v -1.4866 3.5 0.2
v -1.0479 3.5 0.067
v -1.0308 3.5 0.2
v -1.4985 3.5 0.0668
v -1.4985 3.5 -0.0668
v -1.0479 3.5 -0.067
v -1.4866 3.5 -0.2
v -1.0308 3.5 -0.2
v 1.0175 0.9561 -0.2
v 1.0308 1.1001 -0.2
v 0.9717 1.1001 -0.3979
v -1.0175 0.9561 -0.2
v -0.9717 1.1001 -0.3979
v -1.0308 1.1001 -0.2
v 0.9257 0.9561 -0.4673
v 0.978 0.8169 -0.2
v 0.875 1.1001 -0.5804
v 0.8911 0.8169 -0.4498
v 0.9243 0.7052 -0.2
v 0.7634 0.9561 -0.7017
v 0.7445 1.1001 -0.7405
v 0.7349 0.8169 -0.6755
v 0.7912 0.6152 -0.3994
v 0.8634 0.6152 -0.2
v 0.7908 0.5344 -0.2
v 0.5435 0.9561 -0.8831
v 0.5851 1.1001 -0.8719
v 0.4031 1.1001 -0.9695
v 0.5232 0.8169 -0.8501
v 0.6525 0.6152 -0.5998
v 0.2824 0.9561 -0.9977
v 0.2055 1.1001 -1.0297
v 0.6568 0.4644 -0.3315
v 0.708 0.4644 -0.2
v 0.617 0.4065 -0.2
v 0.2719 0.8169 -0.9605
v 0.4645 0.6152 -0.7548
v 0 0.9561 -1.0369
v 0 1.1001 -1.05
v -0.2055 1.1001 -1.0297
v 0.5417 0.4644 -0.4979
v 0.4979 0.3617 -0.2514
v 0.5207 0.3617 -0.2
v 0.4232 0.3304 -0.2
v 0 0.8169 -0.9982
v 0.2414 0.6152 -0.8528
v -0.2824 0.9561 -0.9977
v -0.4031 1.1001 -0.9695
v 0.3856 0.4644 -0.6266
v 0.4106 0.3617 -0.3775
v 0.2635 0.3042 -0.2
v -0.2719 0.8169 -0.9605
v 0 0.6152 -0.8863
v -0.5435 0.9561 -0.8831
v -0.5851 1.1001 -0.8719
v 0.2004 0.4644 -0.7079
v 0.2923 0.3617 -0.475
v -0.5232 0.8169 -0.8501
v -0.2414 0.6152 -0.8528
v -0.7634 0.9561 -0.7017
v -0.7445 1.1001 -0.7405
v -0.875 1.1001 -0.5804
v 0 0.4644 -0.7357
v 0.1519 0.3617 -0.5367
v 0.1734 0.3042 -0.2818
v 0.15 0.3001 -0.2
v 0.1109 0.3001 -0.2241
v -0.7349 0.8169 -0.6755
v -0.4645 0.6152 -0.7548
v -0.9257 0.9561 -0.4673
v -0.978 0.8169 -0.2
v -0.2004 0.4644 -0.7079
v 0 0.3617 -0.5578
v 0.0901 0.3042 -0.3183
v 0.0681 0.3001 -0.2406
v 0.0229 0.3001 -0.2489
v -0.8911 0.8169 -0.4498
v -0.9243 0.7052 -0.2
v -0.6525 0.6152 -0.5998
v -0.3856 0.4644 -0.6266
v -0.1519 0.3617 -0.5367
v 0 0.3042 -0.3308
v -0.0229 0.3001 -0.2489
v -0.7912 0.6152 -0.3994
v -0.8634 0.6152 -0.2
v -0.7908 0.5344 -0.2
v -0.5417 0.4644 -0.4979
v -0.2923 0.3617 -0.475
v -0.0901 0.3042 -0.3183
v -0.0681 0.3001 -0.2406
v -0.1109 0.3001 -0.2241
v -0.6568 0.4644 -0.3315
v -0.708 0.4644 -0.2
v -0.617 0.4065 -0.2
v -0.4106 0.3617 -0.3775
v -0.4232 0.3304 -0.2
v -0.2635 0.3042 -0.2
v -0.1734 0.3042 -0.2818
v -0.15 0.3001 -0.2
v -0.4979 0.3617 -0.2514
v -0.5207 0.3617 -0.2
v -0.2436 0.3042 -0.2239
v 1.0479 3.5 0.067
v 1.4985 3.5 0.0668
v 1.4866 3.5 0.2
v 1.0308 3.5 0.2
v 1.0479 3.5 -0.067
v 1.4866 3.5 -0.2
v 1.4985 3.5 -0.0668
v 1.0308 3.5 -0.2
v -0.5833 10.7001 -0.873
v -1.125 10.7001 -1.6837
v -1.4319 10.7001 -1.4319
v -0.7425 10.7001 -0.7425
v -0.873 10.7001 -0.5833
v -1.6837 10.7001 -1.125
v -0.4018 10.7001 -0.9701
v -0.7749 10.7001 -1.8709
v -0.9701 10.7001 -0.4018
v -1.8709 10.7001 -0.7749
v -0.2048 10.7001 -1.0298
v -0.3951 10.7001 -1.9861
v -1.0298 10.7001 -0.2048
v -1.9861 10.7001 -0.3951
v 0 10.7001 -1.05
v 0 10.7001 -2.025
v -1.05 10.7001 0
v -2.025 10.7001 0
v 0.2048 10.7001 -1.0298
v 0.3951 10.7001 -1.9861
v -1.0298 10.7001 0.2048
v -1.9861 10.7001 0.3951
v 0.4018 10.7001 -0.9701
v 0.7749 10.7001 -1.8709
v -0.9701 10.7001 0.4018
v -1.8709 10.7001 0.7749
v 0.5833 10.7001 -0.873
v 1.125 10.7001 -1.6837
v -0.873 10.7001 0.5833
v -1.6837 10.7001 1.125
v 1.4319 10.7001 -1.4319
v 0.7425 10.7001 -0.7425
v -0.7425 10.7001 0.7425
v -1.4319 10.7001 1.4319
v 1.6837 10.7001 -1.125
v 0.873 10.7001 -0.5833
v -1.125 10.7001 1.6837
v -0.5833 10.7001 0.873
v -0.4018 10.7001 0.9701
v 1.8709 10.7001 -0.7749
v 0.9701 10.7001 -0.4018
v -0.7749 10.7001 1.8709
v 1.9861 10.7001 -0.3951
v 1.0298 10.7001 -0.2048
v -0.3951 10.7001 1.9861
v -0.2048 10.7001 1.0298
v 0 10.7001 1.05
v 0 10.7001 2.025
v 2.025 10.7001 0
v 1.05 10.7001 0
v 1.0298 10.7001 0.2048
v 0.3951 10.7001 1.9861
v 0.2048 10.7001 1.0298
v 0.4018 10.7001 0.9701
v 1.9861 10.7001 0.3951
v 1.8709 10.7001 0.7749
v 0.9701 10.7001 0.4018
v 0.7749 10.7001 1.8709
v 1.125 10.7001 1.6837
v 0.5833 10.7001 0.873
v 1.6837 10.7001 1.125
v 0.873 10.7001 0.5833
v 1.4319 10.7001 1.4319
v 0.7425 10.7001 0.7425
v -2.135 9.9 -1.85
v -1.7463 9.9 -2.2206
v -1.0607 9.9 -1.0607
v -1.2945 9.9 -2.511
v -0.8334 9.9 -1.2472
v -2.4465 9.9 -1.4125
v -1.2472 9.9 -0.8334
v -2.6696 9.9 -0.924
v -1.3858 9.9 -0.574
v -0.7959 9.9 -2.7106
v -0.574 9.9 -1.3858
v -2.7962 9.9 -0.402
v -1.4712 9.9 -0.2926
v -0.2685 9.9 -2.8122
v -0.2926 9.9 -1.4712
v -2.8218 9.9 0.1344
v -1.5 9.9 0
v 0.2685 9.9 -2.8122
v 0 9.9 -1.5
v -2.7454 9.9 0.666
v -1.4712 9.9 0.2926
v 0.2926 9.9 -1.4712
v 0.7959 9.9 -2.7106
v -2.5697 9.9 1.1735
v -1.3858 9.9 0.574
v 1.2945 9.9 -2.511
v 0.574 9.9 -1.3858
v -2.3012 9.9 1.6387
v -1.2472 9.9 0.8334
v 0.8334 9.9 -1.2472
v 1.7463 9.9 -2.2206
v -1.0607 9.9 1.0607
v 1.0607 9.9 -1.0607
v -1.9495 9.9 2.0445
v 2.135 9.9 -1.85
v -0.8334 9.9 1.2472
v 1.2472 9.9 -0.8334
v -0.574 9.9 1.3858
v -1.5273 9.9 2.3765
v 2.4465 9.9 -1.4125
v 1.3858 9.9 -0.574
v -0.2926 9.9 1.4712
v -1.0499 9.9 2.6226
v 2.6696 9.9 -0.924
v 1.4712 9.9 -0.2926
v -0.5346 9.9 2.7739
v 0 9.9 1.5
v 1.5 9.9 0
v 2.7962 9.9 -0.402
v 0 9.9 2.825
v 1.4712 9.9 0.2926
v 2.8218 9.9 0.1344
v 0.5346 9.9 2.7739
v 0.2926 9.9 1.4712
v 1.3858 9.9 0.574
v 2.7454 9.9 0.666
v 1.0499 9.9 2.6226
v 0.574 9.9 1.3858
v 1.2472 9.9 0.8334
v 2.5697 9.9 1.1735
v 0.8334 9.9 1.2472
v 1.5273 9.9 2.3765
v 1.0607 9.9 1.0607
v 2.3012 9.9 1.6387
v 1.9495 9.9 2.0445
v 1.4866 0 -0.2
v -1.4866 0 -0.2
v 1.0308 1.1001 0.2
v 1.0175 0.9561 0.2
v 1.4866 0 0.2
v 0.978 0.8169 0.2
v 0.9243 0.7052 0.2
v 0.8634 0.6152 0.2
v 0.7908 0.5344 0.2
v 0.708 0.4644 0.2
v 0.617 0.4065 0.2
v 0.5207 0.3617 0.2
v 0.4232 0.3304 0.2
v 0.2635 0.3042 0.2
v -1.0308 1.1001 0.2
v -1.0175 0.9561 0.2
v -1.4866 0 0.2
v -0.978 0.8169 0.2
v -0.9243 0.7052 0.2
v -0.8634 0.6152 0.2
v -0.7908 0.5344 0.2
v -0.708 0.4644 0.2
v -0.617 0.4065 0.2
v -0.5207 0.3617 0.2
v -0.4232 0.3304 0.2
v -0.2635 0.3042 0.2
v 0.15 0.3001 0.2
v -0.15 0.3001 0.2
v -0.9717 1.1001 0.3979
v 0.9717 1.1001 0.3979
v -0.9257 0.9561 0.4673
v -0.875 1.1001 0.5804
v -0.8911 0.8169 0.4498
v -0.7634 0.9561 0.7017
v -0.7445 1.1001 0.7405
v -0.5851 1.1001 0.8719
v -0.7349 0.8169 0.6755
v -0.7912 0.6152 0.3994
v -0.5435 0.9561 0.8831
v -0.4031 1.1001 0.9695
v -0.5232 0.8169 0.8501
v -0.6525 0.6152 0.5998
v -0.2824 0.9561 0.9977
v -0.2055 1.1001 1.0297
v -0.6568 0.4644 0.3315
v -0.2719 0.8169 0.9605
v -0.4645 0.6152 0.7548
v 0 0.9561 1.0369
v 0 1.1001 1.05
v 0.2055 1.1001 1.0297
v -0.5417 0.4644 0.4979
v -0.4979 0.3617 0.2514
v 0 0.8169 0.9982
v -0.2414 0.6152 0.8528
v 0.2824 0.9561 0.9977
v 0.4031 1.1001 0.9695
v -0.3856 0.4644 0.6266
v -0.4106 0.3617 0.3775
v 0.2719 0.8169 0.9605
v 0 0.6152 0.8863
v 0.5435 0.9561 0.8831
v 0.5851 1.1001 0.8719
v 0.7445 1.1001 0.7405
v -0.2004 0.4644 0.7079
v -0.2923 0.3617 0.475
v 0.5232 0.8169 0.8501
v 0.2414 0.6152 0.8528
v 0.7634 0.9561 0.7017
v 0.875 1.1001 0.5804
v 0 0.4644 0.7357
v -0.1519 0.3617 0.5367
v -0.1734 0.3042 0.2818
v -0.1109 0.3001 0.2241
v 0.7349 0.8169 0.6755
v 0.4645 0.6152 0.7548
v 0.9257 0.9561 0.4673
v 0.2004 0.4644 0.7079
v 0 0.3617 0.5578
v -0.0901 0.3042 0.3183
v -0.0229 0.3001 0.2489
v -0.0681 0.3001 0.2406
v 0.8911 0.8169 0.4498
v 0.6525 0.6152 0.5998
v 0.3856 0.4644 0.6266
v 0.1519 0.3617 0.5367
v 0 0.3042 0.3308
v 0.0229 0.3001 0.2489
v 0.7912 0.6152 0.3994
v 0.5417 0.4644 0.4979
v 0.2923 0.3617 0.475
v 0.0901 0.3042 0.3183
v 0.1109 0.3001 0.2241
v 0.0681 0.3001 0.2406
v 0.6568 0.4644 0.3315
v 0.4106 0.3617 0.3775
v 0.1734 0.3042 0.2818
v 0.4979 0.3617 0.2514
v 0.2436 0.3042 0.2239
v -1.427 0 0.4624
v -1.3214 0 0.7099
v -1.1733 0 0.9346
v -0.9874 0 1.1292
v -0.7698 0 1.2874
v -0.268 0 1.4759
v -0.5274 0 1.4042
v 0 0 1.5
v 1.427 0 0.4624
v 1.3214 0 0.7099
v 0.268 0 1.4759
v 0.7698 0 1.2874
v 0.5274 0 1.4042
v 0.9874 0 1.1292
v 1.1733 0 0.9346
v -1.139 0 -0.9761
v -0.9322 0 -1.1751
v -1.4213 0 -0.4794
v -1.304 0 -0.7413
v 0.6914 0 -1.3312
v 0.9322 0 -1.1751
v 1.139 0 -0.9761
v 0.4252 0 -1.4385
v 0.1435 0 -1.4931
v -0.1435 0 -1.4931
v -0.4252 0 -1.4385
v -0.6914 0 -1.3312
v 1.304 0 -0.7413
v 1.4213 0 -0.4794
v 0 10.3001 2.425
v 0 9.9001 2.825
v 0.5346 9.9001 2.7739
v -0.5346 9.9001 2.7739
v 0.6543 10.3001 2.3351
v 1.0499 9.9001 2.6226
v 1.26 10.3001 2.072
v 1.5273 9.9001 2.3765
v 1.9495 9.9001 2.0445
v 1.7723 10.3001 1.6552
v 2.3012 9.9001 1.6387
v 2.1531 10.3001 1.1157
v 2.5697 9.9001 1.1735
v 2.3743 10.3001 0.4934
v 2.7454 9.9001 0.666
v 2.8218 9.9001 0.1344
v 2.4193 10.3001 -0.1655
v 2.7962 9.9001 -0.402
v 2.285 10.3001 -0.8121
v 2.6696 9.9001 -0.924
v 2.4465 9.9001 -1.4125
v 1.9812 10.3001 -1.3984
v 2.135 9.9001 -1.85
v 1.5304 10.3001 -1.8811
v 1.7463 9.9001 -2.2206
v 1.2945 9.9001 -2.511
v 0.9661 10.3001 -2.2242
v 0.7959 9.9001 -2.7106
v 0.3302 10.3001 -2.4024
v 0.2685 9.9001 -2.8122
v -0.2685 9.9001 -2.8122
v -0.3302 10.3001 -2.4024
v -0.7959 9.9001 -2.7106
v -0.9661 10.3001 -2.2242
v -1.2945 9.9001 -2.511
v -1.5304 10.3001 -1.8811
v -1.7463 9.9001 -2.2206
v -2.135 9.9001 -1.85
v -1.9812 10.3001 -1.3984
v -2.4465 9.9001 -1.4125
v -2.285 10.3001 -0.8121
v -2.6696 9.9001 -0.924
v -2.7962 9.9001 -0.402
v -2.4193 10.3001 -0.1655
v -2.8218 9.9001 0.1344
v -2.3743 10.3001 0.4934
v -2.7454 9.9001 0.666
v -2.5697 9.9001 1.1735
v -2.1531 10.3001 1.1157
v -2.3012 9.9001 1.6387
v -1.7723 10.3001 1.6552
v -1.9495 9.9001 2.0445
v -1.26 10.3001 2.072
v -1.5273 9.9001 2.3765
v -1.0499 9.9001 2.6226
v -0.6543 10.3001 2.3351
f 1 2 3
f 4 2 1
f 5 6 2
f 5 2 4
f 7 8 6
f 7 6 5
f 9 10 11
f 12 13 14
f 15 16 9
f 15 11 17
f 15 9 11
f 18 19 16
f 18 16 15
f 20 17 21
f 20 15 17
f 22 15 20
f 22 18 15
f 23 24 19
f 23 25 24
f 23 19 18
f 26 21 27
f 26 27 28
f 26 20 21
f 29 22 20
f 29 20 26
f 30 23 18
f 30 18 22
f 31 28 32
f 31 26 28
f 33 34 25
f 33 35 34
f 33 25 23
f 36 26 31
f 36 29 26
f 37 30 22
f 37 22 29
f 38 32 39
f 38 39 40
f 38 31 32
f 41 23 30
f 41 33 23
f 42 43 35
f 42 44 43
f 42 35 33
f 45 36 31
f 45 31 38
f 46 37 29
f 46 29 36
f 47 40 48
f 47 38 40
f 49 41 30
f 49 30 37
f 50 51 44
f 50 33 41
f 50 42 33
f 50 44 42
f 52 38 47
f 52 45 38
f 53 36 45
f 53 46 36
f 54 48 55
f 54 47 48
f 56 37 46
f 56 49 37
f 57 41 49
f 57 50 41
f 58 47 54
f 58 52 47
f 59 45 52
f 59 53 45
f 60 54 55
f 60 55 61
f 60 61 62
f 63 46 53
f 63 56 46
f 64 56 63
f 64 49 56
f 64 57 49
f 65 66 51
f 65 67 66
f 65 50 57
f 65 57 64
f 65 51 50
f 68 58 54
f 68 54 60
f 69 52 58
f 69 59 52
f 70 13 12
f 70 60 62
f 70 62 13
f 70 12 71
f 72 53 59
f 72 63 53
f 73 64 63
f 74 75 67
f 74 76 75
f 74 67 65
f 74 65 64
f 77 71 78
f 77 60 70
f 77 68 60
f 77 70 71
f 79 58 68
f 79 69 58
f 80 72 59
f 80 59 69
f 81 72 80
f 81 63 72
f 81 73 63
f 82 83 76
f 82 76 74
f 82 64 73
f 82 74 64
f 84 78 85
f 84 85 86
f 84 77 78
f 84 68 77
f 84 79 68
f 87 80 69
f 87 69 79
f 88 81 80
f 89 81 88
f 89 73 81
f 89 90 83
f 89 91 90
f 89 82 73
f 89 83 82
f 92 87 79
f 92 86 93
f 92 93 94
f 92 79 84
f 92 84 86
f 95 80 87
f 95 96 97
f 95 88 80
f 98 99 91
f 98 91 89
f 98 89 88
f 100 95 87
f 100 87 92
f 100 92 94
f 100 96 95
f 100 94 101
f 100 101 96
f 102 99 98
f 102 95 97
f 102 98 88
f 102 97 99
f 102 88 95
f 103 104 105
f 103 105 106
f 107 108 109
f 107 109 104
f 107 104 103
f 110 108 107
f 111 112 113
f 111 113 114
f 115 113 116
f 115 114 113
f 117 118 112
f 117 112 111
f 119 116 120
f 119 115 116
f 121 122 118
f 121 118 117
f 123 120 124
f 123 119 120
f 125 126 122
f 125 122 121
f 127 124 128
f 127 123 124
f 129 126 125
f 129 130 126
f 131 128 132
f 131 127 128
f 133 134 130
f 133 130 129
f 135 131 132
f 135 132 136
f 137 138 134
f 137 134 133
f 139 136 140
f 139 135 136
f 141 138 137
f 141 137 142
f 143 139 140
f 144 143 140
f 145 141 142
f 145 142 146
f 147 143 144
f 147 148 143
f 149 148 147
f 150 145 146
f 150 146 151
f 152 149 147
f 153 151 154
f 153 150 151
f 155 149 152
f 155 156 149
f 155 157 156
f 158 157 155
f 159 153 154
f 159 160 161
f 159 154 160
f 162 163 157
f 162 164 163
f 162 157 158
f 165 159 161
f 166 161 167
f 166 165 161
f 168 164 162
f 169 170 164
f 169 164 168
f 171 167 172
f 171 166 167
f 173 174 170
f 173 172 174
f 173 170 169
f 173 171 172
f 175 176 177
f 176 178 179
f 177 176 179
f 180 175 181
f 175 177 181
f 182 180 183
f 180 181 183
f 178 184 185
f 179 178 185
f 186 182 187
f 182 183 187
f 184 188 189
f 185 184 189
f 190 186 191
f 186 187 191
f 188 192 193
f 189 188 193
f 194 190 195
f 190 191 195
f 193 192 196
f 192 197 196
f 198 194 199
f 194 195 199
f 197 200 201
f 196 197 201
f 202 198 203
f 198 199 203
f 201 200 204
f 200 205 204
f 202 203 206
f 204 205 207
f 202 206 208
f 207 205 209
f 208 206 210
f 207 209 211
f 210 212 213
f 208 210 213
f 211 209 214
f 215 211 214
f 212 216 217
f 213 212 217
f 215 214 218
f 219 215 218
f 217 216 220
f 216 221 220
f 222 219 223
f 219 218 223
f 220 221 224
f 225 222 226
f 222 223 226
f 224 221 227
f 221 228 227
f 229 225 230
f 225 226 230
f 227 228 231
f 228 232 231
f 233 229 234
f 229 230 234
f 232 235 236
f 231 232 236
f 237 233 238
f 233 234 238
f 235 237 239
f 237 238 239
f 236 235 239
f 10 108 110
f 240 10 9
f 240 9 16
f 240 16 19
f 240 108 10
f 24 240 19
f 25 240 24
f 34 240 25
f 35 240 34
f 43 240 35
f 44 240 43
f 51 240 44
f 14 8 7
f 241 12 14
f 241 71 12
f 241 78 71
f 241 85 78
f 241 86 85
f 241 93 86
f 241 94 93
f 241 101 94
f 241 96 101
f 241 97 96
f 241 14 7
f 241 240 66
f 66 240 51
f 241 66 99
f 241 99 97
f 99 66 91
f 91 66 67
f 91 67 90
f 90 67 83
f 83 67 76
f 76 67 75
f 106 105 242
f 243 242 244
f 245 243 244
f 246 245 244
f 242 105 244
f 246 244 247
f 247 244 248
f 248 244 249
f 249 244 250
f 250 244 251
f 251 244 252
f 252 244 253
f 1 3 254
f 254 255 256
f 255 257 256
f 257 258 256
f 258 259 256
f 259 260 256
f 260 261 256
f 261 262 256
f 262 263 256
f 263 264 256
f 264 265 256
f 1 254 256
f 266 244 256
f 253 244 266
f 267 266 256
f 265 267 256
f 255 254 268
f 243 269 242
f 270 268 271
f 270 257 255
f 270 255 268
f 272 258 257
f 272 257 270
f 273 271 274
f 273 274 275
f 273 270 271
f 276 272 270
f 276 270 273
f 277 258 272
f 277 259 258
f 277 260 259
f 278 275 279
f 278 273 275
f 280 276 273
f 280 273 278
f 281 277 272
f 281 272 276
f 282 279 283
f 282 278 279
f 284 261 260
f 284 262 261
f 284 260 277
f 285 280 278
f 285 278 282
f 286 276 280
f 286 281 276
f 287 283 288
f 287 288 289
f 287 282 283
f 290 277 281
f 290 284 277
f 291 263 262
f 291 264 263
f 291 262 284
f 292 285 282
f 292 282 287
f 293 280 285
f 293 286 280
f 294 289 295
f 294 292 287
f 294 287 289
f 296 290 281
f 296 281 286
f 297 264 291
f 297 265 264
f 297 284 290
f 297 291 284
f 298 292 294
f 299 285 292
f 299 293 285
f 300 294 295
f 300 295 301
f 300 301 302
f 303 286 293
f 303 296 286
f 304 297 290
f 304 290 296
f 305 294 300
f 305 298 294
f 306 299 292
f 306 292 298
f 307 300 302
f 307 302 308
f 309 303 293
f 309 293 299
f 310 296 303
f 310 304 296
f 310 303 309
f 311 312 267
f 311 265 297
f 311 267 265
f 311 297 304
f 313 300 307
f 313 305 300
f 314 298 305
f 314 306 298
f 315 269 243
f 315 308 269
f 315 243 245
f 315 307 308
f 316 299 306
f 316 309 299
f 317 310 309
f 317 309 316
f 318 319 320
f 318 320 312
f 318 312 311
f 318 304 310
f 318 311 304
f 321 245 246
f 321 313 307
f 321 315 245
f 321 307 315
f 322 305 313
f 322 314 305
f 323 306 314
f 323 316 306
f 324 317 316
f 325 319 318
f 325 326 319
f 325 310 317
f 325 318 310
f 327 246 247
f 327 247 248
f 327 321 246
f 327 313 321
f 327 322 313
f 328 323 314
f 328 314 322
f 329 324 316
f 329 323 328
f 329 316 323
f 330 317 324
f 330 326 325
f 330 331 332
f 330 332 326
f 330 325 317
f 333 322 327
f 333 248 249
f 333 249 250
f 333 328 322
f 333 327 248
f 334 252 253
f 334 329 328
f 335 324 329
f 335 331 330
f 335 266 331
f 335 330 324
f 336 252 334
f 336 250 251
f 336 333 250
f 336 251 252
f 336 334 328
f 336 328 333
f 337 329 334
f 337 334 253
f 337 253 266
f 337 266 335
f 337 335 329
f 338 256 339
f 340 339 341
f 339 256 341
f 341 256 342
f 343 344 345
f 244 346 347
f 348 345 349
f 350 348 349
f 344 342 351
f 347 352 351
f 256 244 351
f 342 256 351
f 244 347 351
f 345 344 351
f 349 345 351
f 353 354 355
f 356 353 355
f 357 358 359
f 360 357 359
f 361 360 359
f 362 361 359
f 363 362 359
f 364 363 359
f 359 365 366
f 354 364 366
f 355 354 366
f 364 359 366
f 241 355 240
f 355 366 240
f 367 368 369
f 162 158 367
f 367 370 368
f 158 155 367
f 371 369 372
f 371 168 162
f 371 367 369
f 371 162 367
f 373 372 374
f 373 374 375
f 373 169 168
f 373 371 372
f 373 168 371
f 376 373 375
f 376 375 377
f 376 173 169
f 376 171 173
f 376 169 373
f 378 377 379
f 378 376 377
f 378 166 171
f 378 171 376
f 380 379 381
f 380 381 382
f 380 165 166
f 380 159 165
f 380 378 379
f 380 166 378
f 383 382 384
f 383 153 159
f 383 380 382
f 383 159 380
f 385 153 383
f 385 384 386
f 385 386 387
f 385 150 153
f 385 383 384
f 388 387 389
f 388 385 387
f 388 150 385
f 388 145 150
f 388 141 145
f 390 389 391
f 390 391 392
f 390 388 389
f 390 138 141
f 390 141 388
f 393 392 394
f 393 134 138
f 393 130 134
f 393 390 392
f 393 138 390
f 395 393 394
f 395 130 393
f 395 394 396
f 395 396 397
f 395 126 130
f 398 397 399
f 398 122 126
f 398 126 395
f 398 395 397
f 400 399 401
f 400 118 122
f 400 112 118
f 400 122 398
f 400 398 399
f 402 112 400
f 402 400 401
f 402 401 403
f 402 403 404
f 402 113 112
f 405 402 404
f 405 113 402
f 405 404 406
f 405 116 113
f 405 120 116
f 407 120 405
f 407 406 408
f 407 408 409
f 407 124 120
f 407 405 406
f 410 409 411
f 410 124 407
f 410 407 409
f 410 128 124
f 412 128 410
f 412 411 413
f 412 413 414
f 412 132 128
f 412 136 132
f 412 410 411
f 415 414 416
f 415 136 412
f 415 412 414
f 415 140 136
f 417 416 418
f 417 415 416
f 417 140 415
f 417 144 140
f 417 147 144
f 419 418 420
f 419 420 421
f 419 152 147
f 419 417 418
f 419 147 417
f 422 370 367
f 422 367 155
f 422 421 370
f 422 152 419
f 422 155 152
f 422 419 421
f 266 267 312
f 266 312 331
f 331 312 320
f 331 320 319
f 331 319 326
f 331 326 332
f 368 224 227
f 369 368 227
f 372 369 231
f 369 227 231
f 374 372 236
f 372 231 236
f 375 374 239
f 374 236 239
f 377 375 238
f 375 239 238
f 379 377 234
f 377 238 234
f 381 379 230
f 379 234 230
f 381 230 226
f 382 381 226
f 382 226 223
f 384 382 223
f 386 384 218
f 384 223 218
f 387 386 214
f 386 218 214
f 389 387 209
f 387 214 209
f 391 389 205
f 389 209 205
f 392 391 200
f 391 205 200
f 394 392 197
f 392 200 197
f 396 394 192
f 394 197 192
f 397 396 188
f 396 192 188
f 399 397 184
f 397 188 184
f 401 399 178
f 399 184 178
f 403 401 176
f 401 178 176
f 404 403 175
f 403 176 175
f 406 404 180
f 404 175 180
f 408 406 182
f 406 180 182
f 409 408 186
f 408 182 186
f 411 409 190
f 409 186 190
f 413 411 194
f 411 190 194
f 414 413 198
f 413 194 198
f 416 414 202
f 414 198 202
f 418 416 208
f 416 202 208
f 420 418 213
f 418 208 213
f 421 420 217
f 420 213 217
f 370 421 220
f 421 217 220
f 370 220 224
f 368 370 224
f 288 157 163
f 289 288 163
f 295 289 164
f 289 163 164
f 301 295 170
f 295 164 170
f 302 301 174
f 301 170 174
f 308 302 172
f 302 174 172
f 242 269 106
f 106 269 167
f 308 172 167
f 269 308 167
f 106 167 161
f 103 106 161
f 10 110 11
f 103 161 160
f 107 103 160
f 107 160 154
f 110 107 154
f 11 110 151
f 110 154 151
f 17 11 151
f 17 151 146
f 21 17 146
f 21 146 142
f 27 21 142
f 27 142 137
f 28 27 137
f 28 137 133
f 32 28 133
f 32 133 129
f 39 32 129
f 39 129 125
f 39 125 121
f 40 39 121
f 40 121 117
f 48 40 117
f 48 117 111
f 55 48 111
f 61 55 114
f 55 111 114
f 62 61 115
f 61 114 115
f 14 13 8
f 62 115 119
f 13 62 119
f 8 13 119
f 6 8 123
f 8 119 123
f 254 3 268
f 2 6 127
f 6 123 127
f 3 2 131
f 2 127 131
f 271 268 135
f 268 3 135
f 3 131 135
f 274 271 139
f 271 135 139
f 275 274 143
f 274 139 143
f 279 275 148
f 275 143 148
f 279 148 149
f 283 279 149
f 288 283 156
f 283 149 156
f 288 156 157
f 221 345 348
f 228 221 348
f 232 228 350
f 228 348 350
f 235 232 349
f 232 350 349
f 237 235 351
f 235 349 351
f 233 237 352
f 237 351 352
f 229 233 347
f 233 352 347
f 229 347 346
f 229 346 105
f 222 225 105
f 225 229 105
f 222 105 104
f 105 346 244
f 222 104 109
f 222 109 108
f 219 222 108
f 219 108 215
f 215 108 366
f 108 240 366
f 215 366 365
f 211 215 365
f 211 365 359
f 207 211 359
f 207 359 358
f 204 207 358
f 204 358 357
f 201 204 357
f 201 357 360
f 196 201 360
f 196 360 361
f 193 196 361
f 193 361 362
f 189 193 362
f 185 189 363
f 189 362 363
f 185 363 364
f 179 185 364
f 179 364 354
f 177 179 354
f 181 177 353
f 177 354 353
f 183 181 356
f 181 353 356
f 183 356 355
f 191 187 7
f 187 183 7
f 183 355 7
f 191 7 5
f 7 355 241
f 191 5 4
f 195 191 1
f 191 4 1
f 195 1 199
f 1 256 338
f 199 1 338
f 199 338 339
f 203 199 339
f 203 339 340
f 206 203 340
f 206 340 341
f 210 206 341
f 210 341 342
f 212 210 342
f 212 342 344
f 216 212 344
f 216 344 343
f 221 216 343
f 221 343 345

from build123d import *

# Parameters (mm, degrees)
CROQUIS1_R                   = 1.5
SALIENTE_EXTRUIR1_DEPTH      = 10.7
SALIENTE_EXTRUIR2_DEPTH      = 0.0001
SALIENTE_EXTRUIR2_DEPTH_BACK = 0.8
CROQUIS2_R                   = 2.825
CHAFL_N1_SIZE                = 0.8
CROQUIS3_R                   = 1.05
CORTAR_EXTRUIR1_DEPTH        = 10.4
REDONDEO2_R                  = 0.8
CROQUIS6_W                   = 3
CROQUIS6_H                   = 0.4
CORTAR_EXTRUIR4_DEPTH        = 3.5


with BuildPart() as part:
    # Croquis1 → Saliente-Extruir1 (new body)
    with BuildSketch(Plane(origin=(0, 0, 0), x_dir=(1, 0, 0), z_dir=(0, 1, 0))):
        with Locations(Location((0, 0, 0), (0, 0, 270))):
            Circle(CROQUIS1_R)
    extrude(amount=SALIENTE_EXTRUIR1_DEPTH)

    # Croquis2 → Saliente-Extruir2 (add, two sides: drawn at the far end of the back side and taken through both)
    with BuildSketch(Plane(origin=(0, 10.7, 0), x_dir=(1, 0, 0), z_dir=(0, 1, 0)).offset(-SALIENTE_EXTRUIR2_DEPTH_BACK)):
        with Locations(Location((0, 0, 0), (0, 0, 270))):
            Circle(CROQUIS2_R)
    extrude(amount=SALIENTE_EXTRUIR2_DEPTH + SALIENTE_EXTRUIR2_DEPTH_BACK)

    # Chaflán1
    chafl_n1_edges = [part.edges().sort_by_distance(p)[0] for p in [
        (0, 10.7001, -2.825),
    ]]
    chamfer(chafl_n1_edges, length=CHAFL_N1_SIZE)

    # Croquis3 → Cortar-Extruir1 (cut)
    with BuildSketch(Plane(origin=(0, 10.7001, 0), x_dir=(1, 0, 0), z_dir=(0, 1, 0))):
        with Locations(Location((0, 0, 0), (0, 0, 270))):
            Circle(CROQUIS3_R)
    extrude(amount=-CORTAR_EXTRUIR1_DEPTH, mode=Mode.SUBTRACT)

    # Redondeo2
    redondeo2_edges = [part.edges().sort_by_distance(p)[0] for p in [
        (0, 0.3001, -1.05),
    ]]
    fillet(redondeo2_edges, radius=REDONDEO2_R)

    # Croquis6 → Cortar-Extruir4 (cut)
    with BuildSketch(Plane(origin=(0, 0, 0), x_dir=(-1, 0, 0), z_dir=(0, -1, 0))):
        Rectangle(CROQUIS6_W, CROQUIS6_H)
    extrude(amount=-CORTAR_EXTRUIR4_DEPTH, mode=Mode.SUBTRACT)


solid = part.part
